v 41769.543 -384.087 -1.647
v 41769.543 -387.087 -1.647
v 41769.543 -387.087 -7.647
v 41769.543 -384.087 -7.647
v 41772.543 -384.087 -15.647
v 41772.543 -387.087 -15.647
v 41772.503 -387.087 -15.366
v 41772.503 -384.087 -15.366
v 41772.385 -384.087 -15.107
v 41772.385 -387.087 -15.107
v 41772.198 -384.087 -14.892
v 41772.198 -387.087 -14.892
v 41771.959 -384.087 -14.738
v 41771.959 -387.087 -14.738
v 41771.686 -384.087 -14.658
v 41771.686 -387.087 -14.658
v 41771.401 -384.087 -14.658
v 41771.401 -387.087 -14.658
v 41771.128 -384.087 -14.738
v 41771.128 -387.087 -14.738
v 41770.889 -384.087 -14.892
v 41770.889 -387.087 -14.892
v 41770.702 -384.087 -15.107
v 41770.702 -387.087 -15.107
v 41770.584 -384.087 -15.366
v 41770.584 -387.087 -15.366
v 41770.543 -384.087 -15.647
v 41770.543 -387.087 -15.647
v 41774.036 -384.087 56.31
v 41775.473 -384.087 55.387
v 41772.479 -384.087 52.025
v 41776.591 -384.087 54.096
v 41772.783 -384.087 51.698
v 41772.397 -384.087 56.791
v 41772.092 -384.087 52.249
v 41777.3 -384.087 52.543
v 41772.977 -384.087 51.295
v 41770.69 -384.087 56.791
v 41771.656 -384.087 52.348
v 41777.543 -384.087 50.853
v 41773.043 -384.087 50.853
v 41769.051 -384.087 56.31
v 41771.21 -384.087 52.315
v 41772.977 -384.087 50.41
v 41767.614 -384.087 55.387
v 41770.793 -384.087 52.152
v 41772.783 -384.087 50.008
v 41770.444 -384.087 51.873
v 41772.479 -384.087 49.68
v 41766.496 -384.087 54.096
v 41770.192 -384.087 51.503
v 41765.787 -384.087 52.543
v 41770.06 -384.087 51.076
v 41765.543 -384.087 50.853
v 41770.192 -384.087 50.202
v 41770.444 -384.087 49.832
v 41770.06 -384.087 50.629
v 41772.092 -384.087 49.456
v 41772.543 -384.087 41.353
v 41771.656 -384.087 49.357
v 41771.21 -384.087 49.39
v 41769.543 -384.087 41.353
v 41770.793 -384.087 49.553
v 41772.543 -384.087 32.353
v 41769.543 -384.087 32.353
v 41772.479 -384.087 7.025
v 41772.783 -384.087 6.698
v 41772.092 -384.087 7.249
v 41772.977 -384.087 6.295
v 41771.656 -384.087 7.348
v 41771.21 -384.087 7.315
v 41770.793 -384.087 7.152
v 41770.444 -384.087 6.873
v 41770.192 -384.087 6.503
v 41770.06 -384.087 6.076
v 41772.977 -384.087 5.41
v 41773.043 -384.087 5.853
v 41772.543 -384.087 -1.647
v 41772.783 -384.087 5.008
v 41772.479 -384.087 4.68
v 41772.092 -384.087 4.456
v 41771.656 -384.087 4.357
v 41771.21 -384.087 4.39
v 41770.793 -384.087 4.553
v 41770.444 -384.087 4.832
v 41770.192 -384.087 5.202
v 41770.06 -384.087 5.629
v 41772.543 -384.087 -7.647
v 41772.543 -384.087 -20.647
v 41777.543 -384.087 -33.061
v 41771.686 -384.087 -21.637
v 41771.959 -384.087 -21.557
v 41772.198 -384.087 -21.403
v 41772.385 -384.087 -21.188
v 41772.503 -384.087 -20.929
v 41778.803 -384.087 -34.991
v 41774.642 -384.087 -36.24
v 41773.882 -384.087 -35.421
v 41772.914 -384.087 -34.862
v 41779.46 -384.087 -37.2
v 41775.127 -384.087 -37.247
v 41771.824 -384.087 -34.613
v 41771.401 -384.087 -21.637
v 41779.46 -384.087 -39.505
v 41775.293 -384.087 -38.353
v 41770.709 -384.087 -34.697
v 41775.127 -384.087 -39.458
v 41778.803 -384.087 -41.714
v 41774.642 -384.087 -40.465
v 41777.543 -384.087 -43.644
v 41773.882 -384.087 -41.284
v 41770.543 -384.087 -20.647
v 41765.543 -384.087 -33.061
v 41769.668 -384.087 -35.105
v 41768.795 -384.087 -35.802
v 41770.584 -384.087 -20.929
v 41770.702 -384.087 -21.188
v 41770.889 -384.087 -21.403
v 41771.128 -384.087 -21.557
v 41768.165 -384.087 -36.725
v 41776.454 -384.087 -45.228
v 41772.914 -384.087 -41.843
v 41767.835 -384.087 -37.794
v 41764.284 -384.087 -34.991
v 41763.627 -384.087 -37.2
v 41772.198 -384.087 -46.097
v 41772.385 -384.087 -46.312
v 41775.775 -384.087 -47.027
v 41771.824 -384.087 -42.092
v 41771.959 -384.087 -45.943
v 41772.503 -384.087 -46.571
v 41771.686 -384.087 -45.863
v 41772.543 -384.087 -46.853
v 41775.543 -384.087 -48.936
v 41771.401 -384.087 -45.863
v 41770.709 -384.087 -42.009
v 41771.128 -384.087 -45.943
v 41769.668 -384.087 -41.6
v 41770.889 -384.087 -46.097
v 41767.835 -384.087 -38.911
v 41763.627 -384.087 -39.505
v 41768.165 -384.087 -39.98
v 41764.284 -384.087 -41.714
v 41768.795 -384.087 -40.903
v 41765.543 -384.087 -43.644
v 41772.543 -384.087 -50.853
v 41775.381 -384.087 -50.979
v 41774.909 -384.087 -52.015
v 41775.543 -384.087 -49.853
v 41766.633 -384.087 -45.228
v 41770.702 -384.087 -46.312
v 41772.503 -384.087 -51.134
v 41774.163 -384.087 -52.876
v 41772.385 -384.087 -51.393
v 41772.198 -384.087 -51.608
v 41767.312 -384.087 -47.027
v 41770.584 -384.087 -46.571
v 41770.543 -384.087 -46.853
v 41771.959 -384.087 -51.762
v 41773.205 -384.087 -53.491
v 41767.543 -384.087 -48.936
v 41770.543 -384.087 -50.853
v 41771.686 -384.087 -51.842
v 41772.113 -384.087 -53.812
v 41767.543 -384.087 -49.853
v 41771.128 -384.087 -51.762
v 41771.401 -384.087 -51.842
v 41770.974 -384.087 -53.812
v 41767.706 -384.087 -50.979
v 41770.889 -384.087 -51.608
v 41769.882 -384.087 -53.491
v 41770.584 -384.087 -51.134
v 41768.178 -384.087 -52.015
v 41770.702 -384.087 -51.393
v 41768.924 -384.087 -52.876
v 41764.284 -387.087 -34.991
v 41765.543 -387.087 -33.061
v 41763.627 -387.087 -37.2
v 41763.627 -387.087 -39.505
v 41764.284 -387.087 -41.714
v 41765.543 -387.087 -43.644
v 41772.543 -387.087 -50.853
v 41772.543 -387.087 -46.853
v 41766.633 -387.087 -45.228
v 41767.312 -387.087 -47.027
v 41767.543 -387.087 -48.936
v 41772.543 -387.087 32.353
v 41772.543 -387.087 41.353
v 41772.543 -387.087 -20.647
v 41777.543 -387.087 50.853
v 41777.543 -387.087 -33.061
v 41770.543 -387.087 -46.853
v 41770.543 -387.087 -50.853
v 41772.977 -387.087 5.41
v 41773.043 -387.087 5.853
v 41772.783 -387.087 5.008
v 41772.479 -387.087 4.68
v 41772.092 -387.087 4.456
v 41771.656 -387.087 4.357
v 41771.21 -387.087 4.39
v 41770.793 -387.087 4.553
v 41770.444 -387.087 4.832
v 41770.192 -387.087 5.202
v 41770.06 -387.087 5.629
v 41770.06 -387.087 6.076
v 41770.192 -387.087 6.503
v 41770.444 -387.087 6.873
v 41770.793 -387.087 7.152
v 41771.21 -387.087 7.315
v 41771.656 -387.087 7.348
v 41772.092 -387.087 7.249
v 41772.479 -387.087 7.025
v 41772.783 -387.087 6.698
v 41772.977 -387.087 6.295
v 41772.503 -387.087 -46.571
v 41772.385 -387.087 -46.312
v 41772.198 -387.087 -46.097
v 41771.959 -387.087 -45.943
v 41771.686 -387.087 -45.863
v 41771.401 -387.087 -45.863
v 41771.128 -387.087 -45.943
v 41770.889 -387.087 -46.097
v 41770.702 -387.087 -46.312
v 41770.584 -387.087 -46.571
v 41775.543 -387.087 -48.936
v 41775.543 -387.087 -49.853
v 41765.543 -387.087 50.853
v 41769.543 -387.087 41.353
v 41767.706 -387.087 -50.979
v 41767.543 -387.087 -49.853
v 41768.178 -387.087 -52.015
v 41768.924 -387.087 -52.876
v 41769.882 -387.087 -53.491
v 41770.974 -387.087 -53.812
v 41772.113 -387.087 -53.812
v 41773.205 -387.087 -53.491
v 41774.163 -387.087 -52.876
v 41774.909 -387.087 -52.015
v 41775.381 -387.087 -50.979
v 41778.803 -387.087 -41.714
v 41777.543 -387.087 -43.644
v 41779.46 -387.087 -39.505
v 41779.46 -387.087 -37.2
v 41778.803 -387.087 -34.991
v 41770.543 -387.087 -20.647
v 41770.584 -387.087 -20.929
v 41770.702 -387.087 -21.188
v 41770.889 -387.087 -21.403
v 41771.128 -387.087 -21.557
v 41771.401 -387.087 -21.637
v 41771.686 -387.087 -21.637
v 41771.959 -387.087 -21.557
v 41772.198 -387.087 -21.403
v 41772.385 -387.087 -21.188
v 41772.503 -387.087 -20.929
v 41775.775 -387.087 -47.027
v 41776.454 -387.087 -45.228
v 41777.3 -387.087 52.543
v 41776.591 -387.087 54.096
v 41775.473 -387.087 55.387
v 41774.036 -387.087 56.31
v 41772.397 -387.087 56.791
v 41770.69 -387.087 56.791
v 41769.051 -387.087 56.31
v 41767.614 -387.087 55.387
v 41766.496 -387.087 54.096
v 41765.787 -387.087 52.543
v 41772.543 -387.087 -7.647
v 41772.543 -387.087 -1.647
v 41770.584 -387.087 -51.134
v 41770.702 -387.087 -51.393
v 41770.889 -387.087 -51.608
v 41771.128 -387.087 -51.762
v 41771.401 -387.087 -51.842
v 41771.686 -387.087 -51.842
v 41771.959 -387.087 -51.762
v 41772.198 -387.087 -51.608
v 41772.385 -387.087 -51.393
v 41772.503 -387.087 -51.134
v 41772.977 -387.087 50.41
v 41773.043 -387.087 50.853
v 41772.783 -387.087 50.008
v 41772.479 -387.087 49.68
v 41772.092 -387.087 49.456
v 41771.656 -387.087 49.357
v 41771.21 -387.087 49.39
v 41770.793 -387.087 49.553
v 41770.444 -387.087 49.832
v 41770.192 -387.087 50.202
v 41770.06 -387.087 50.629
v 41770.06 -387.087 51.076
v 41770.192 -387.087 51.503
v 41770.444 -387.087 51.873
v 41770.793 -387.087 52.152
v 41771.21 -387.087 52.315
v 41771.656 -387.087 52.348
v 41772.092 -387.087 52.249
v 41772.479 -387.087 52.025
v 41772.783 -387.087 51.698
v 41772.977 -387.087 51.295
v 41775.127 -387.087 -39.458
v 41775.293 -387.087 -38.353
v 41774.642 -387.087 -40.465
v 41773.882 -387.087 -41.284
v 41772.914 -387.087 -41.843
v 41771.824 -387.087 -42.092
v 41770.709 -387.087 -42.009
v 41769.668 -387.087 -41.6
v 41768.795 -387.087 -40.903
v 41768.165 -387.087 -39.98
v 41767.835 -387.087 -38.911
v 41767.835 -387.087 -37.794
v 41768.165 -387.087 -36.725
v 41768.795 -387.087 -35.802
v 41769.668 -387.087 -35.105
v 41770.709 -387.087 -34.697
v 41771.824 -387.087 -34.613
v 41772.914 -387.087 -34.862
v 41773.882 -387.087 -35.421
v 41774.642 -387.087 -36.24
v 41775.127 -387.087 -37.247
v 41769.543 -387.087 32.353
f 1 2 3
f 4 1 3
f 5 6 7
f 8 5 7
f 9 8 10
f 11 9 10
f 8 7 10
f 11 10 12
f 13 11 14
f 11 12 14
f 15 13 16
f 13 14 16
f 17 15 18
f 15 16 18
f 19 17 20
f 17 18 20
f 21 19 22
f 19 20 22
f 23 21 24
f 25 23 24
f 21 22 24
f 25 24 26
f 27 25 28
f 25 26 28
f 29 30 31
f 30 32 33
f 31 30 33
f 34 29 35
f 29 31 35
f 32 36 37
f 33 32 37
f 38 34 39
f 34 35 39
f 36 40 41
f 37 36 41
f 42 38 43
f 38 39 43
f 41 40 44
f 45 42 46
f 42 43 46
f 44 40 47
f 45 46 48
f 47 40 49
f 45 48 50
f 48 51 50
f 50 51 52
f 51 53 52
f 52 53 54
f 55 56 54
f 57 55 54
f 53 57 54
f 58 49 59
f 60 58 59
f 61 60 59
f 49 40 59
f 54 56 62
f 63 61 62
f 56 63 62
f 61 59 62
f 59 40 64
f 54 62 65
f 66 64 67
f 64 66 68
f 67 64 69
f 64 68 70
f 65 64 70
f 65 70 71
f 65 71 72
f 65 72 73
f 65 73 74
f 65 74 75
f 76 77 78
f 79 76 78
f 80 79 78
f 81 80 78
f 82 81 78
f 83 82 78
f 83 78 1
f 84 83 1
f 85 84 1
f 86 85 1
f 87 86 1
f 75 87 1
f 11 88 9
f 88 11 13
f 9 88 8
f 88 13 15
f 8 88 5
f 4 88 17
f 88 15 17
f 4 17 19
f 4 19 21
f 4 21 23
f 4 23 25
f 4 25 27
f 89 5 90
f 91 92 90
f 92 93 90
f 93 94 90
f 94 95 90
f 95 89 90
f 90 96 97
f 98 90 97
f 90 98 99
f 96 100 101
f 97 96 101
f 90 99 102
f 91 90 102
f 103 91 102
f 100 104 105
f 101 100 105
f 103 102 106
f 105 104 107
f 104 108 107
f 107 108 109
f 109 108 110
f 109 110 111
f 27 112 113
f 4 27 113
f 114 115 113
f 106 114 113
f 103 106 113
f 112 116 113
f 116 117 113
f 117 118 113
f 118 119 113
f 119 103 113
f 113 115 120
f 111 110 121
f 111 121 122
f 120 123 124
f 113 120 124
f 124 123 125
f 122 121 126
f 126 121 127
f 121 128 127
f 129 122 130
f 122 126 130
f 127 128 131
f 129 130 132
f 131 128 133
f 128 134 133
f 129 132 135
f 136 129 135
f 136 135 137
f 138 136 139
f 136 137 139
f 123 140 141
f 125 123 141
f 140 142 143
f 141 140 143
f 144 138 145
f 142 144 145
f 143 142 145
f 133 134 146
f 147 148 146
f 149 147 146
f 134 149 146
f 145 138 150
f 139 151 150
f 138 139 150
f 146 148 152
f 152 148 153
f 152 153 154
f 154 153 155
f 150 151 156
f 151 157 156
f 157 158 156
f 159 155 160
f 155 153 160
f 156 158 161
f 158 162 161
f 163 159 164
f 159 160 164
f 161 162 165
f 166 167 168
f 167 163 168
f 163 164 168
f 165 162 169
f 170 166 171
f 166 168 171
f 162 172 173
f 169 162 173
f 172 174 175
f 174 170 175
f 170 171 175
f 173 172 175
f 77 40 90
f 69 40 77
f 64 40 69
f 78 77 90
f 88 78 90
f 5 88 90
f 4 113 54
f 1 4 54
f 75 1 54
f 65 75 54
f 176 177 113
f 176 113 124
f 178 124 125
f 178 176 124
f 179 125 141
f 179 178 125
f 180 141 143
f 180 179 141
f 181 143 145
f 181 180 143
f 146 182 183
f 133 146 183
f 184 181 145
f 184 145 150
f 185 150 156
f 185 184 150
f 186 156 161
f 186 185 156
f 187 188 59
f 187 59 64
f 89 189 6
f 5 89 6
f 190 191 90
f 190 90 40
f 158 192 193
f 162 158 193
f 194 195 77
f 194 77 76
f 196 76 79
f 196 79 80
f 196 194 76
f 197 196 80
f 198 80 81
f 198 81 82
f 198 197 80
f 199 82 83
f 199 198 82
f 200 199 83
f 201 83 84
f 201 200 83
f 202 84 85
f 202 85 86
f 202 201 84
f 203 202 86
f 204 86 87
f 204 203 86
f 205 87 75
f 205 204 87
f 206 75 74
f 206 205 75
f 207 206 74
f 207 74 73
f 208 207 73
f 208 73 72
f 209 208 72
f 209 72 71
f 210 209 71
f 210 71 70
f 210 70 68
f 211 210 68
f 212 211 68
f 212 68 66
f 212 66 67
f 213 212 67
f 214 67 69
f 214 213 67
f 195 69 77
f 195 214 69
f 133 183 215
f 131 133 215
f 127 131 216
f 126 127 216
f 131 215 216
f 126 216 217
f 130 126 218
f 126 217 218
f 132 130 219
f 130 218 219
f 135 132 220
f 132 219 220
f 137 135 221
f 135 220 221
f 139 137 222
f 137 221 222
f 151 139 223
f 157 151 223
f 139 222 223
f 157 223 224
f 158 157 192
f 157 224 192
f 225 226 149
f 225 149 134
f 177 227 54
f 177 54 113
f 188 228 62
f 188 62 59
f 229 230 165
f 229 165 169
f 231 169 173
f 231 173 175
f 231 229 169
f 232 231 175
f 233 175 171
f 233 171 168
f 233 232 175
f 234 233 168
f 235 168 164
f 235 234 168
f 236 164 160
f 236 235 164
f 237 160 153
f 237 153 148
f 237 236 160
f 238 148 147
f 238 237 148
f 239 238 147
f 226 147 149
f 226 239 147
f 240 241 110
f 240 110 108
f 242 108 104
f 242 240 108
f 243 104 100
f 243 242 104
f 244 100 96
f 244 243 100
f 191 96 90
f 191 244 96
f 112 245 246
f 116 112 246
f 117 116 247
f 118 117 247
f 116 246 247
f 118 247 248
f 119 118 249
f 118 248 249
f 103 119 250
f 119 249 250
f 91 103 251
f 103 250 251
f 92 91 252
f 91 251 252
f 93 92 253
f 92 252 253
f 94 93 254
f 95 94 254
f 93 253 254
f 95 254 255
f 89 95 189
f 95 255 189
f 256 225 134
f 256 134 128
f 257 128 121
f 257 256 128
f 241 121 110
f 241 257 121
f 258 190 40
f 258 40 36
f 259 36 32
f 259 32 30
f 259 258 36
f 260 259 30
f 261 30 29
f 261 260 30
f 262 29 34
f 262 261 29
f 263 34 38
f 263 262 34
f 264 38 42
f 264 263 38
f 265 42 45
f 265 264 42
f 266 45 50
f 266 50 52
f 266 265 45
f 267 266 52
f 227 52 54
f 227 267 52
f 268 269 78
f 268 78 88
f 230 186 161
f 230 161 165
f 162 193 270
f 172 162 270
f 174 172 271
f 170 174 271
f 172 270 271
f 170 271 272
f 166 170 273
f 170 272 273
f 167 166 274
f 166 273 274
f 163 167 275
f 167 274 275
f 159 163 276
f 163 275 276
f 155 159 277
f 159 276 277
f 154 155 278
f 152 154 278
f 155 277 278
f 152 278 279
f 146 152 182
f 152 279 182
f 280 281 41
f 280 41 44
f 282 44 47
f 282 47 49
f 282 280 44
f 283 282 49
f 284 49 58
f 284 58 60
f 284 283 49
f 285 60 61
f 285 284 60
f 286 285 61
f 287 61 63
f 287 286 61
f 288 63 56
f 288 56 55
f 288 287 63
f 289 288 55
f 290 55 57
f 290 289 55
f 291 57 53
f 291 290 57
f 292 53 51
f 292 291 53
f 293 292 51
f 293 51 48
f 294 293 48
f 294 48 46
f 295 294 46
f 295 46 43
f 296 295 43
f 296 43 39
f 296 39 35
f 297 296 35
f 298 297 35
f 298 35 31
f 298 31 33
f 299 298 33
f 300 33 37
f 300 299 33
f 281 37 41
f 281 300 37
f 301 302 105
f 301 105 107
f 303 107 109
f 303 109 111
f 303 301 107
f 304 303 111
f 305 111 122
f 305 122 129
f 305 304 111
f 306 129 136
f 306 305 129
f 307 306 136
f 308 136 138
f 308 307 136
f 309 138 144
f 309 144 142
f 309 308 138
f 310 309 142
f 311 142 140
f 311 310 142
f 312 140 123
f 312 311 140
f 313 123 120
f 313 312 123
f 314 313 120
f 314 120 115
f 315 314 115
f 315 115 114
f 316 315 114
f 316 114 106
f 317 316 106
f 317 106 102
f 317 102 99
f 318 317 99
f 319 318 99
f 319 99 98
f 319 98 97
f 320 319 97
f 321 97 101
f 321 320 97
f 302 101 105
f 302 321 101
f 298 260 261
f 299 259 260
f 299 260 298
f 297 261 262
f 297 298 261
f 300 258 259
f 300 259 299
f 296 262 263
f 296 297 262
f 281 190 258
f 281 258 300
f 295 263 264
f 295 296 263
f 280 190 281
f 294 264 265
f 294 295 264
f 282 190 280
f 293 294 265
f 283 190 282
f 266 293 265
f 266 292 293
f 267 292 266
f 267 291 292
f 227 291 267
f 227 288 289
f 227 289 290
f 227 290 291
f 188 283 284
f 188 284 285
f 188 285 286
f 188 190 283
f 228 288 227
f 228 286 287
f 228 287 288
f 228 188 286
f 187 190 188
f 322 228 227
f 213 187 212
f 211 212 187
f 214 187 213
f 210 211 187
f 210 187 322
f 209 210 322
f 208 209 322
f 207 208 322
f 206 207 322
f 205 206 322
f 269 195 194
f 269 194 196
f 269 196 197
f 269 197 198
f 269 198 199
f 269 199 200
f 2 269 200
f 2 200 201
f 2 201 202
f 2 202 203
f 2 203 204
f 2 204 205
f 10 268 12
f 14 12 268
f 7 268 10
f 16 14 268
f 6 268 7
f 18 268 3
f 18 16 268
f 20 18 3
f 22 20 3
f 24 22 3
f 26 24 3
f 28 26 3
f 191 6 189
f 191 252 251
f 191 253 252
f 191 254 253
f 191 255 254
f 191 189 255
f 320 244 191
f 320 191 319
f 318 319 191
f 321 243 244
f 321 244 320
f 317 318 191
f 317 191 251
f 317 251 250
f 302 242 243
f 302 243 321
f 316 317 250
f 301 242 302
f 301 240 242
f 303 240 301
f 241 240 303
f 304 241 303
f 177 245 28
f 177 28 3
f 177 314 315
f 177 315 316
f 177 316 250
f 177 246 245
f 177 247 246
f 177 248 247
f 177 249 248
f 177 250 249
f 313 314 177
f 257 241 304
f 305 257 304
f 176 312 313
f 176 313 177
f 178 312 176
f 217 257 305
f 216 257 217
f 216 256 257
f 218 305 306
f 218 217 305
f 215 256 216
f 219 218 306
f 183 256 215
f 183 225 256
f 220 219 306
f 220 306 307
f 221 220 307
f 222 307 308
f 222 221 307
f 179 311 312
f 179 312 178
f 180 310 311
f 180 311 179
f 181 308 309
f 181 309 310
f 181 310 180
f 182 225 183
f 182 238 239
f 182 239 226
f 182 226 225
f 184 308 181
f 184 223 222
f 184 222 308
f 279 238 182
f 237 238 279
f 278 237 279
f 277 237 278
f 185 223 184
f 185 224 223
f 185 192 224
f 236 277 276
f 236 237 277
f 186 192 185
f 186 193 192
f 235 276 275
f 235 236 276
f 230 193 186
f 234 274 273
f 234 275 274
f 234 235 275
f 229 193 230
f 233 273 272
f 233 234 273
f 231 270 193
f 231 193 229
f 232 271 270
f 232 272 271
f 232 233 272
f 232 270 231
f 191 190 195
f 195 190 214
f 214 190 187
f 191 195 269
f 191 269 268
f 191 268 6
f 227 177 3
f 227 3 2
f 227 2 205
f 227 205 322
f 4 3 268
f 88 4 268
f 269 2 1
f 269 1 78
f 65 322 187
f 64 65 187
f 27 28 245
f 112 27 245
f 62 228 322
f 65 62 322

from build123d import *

# Parameters (mm, degrees)
CROQUIS1_R                 = 1.5
CROQUIS1_R_2               = 3.75
CROQUIS1_W                 = 3
CROQUIS1_H                 = 6
CROQUIS1_H_2               = 9
SALIENTE_EXTRUIR1_DEPTH    = 3
S_LIDO_MOVER_COPIAR1_ANGLE = 90


with BuildPart() as part:
    # Croquis1 → Saliente-Extruir1 (new body)
    with BuildSketch(Plane.XY):
        with BuildLine():
            Line((41777.543498403, -351.025953533), (41777.543498403, -434.939495491))
            ThreePointArc((41777.543498403, -434.939495491), (41771.543498403, -440.939495491), (41765.543498403, -434.939495491))
            Line((41765.543498403, -434.939495491), (41765.543498403, -351.025953694))
            ThreePointArc((41765.543498403, -351.025953694), (41763.543498332, -345.734451045), (41765.543498332, -340.44294837))
            ThreePointArc((41765.543498332, -340.44294837), (41767.026813105, -337.979872872), (41767.543498332, -335.151445748))
            Line((41767.543498332, -335.151445748), (41767.543498332, -334.234450911))
            ThreePointArc((41767.543498332, -334.234450911), (41771.543498261, -330.234450982), (41775.54349819, -334.234450911))
            Line((41775.54349819, -334.234450911), (41775.54349819, -335.151445587))
            ThreePointArc((41775.54349819, -335.151445587), (41776.060183455, -337.979872812), (41777.543498332, -340.44294837))
            ThreePointArc((41777.543498332, -340.44294837), (41779.543498332, -345.734450938), (41777.543498403, -351.025953533))
        make_face()
        with Locations((41771.543498403, -434.939495491)):
            Circle(CROQUIS1_R, mode=Mode.SUBTRACT)
        with Locations((41771.543498545, -389.939495491)):
            Circle(CROQUIS1_R, mode=Mode.SUBTRACT)
        with Locations((41771.543498332, -345.734450992)):
            Circle(CROQUIS1_R_2, mode=Mode.SUBTRACT)
        with BuildLine():
            Line((41772.543498261, -333.234450911), (41772.543498261, -337.234450911))
            ThreePointArc((41772.543498261, -337.234450911), (41771.543498261, -338.234450911), (41770.543498261, -337.234450911))
            Line((41770.543498261, -337.234450911), (41770.543498261, -333.234450911))
            ThreePointArc((41770.543498261, -333.234450911), (41771.543498261, -332.234450911), (41772.543498261, -333.234450911))
        make_face(mode=Mode.SUBTRACT)
        with BuildLine():
            Line((41772.543498545, -363.439495491), (41772.543498545, -368.439495491))
            ThreePointArc((41772.543498545, -368.439495491), (41771.543498545, -369.439495491), (41770.543498545, -368.439495491))
            Line((41770.543498545, -368.439495491), (41770.543498545, -363.439495491))
            ThreePointArc((41770.543498545, -363.439495491), (41771.543498545, -362.439495491), (41772.543498545, -363.439495491))
        make_face(mode=Mode.SUBTRACT)
        with Locations((41771.043498545, -379.439495491)):
            Rectangle(CROQUIS1_W, CROQUIS1_H, mode=Mode.SUBTRACT)
        with Locations((41771.043498545, -420.939495491)):
            Rectangle(CROQUIS1_W, CROQUIS1_H_2, mode=Mode.SUBTRACT)
    extrude(amount=SALIENTE_EXTRUIR1_DEPTH)


with BuildPart() as part_1:
    # Sólido-Mover/Copiar1: moved
    add(part.part.rotate(Axis((0, -385.586973236, 1.5), (-1, 0, 0)), S_LIDO_MOVER_COPIAR1_ANGLE))


solid = part_1.part
